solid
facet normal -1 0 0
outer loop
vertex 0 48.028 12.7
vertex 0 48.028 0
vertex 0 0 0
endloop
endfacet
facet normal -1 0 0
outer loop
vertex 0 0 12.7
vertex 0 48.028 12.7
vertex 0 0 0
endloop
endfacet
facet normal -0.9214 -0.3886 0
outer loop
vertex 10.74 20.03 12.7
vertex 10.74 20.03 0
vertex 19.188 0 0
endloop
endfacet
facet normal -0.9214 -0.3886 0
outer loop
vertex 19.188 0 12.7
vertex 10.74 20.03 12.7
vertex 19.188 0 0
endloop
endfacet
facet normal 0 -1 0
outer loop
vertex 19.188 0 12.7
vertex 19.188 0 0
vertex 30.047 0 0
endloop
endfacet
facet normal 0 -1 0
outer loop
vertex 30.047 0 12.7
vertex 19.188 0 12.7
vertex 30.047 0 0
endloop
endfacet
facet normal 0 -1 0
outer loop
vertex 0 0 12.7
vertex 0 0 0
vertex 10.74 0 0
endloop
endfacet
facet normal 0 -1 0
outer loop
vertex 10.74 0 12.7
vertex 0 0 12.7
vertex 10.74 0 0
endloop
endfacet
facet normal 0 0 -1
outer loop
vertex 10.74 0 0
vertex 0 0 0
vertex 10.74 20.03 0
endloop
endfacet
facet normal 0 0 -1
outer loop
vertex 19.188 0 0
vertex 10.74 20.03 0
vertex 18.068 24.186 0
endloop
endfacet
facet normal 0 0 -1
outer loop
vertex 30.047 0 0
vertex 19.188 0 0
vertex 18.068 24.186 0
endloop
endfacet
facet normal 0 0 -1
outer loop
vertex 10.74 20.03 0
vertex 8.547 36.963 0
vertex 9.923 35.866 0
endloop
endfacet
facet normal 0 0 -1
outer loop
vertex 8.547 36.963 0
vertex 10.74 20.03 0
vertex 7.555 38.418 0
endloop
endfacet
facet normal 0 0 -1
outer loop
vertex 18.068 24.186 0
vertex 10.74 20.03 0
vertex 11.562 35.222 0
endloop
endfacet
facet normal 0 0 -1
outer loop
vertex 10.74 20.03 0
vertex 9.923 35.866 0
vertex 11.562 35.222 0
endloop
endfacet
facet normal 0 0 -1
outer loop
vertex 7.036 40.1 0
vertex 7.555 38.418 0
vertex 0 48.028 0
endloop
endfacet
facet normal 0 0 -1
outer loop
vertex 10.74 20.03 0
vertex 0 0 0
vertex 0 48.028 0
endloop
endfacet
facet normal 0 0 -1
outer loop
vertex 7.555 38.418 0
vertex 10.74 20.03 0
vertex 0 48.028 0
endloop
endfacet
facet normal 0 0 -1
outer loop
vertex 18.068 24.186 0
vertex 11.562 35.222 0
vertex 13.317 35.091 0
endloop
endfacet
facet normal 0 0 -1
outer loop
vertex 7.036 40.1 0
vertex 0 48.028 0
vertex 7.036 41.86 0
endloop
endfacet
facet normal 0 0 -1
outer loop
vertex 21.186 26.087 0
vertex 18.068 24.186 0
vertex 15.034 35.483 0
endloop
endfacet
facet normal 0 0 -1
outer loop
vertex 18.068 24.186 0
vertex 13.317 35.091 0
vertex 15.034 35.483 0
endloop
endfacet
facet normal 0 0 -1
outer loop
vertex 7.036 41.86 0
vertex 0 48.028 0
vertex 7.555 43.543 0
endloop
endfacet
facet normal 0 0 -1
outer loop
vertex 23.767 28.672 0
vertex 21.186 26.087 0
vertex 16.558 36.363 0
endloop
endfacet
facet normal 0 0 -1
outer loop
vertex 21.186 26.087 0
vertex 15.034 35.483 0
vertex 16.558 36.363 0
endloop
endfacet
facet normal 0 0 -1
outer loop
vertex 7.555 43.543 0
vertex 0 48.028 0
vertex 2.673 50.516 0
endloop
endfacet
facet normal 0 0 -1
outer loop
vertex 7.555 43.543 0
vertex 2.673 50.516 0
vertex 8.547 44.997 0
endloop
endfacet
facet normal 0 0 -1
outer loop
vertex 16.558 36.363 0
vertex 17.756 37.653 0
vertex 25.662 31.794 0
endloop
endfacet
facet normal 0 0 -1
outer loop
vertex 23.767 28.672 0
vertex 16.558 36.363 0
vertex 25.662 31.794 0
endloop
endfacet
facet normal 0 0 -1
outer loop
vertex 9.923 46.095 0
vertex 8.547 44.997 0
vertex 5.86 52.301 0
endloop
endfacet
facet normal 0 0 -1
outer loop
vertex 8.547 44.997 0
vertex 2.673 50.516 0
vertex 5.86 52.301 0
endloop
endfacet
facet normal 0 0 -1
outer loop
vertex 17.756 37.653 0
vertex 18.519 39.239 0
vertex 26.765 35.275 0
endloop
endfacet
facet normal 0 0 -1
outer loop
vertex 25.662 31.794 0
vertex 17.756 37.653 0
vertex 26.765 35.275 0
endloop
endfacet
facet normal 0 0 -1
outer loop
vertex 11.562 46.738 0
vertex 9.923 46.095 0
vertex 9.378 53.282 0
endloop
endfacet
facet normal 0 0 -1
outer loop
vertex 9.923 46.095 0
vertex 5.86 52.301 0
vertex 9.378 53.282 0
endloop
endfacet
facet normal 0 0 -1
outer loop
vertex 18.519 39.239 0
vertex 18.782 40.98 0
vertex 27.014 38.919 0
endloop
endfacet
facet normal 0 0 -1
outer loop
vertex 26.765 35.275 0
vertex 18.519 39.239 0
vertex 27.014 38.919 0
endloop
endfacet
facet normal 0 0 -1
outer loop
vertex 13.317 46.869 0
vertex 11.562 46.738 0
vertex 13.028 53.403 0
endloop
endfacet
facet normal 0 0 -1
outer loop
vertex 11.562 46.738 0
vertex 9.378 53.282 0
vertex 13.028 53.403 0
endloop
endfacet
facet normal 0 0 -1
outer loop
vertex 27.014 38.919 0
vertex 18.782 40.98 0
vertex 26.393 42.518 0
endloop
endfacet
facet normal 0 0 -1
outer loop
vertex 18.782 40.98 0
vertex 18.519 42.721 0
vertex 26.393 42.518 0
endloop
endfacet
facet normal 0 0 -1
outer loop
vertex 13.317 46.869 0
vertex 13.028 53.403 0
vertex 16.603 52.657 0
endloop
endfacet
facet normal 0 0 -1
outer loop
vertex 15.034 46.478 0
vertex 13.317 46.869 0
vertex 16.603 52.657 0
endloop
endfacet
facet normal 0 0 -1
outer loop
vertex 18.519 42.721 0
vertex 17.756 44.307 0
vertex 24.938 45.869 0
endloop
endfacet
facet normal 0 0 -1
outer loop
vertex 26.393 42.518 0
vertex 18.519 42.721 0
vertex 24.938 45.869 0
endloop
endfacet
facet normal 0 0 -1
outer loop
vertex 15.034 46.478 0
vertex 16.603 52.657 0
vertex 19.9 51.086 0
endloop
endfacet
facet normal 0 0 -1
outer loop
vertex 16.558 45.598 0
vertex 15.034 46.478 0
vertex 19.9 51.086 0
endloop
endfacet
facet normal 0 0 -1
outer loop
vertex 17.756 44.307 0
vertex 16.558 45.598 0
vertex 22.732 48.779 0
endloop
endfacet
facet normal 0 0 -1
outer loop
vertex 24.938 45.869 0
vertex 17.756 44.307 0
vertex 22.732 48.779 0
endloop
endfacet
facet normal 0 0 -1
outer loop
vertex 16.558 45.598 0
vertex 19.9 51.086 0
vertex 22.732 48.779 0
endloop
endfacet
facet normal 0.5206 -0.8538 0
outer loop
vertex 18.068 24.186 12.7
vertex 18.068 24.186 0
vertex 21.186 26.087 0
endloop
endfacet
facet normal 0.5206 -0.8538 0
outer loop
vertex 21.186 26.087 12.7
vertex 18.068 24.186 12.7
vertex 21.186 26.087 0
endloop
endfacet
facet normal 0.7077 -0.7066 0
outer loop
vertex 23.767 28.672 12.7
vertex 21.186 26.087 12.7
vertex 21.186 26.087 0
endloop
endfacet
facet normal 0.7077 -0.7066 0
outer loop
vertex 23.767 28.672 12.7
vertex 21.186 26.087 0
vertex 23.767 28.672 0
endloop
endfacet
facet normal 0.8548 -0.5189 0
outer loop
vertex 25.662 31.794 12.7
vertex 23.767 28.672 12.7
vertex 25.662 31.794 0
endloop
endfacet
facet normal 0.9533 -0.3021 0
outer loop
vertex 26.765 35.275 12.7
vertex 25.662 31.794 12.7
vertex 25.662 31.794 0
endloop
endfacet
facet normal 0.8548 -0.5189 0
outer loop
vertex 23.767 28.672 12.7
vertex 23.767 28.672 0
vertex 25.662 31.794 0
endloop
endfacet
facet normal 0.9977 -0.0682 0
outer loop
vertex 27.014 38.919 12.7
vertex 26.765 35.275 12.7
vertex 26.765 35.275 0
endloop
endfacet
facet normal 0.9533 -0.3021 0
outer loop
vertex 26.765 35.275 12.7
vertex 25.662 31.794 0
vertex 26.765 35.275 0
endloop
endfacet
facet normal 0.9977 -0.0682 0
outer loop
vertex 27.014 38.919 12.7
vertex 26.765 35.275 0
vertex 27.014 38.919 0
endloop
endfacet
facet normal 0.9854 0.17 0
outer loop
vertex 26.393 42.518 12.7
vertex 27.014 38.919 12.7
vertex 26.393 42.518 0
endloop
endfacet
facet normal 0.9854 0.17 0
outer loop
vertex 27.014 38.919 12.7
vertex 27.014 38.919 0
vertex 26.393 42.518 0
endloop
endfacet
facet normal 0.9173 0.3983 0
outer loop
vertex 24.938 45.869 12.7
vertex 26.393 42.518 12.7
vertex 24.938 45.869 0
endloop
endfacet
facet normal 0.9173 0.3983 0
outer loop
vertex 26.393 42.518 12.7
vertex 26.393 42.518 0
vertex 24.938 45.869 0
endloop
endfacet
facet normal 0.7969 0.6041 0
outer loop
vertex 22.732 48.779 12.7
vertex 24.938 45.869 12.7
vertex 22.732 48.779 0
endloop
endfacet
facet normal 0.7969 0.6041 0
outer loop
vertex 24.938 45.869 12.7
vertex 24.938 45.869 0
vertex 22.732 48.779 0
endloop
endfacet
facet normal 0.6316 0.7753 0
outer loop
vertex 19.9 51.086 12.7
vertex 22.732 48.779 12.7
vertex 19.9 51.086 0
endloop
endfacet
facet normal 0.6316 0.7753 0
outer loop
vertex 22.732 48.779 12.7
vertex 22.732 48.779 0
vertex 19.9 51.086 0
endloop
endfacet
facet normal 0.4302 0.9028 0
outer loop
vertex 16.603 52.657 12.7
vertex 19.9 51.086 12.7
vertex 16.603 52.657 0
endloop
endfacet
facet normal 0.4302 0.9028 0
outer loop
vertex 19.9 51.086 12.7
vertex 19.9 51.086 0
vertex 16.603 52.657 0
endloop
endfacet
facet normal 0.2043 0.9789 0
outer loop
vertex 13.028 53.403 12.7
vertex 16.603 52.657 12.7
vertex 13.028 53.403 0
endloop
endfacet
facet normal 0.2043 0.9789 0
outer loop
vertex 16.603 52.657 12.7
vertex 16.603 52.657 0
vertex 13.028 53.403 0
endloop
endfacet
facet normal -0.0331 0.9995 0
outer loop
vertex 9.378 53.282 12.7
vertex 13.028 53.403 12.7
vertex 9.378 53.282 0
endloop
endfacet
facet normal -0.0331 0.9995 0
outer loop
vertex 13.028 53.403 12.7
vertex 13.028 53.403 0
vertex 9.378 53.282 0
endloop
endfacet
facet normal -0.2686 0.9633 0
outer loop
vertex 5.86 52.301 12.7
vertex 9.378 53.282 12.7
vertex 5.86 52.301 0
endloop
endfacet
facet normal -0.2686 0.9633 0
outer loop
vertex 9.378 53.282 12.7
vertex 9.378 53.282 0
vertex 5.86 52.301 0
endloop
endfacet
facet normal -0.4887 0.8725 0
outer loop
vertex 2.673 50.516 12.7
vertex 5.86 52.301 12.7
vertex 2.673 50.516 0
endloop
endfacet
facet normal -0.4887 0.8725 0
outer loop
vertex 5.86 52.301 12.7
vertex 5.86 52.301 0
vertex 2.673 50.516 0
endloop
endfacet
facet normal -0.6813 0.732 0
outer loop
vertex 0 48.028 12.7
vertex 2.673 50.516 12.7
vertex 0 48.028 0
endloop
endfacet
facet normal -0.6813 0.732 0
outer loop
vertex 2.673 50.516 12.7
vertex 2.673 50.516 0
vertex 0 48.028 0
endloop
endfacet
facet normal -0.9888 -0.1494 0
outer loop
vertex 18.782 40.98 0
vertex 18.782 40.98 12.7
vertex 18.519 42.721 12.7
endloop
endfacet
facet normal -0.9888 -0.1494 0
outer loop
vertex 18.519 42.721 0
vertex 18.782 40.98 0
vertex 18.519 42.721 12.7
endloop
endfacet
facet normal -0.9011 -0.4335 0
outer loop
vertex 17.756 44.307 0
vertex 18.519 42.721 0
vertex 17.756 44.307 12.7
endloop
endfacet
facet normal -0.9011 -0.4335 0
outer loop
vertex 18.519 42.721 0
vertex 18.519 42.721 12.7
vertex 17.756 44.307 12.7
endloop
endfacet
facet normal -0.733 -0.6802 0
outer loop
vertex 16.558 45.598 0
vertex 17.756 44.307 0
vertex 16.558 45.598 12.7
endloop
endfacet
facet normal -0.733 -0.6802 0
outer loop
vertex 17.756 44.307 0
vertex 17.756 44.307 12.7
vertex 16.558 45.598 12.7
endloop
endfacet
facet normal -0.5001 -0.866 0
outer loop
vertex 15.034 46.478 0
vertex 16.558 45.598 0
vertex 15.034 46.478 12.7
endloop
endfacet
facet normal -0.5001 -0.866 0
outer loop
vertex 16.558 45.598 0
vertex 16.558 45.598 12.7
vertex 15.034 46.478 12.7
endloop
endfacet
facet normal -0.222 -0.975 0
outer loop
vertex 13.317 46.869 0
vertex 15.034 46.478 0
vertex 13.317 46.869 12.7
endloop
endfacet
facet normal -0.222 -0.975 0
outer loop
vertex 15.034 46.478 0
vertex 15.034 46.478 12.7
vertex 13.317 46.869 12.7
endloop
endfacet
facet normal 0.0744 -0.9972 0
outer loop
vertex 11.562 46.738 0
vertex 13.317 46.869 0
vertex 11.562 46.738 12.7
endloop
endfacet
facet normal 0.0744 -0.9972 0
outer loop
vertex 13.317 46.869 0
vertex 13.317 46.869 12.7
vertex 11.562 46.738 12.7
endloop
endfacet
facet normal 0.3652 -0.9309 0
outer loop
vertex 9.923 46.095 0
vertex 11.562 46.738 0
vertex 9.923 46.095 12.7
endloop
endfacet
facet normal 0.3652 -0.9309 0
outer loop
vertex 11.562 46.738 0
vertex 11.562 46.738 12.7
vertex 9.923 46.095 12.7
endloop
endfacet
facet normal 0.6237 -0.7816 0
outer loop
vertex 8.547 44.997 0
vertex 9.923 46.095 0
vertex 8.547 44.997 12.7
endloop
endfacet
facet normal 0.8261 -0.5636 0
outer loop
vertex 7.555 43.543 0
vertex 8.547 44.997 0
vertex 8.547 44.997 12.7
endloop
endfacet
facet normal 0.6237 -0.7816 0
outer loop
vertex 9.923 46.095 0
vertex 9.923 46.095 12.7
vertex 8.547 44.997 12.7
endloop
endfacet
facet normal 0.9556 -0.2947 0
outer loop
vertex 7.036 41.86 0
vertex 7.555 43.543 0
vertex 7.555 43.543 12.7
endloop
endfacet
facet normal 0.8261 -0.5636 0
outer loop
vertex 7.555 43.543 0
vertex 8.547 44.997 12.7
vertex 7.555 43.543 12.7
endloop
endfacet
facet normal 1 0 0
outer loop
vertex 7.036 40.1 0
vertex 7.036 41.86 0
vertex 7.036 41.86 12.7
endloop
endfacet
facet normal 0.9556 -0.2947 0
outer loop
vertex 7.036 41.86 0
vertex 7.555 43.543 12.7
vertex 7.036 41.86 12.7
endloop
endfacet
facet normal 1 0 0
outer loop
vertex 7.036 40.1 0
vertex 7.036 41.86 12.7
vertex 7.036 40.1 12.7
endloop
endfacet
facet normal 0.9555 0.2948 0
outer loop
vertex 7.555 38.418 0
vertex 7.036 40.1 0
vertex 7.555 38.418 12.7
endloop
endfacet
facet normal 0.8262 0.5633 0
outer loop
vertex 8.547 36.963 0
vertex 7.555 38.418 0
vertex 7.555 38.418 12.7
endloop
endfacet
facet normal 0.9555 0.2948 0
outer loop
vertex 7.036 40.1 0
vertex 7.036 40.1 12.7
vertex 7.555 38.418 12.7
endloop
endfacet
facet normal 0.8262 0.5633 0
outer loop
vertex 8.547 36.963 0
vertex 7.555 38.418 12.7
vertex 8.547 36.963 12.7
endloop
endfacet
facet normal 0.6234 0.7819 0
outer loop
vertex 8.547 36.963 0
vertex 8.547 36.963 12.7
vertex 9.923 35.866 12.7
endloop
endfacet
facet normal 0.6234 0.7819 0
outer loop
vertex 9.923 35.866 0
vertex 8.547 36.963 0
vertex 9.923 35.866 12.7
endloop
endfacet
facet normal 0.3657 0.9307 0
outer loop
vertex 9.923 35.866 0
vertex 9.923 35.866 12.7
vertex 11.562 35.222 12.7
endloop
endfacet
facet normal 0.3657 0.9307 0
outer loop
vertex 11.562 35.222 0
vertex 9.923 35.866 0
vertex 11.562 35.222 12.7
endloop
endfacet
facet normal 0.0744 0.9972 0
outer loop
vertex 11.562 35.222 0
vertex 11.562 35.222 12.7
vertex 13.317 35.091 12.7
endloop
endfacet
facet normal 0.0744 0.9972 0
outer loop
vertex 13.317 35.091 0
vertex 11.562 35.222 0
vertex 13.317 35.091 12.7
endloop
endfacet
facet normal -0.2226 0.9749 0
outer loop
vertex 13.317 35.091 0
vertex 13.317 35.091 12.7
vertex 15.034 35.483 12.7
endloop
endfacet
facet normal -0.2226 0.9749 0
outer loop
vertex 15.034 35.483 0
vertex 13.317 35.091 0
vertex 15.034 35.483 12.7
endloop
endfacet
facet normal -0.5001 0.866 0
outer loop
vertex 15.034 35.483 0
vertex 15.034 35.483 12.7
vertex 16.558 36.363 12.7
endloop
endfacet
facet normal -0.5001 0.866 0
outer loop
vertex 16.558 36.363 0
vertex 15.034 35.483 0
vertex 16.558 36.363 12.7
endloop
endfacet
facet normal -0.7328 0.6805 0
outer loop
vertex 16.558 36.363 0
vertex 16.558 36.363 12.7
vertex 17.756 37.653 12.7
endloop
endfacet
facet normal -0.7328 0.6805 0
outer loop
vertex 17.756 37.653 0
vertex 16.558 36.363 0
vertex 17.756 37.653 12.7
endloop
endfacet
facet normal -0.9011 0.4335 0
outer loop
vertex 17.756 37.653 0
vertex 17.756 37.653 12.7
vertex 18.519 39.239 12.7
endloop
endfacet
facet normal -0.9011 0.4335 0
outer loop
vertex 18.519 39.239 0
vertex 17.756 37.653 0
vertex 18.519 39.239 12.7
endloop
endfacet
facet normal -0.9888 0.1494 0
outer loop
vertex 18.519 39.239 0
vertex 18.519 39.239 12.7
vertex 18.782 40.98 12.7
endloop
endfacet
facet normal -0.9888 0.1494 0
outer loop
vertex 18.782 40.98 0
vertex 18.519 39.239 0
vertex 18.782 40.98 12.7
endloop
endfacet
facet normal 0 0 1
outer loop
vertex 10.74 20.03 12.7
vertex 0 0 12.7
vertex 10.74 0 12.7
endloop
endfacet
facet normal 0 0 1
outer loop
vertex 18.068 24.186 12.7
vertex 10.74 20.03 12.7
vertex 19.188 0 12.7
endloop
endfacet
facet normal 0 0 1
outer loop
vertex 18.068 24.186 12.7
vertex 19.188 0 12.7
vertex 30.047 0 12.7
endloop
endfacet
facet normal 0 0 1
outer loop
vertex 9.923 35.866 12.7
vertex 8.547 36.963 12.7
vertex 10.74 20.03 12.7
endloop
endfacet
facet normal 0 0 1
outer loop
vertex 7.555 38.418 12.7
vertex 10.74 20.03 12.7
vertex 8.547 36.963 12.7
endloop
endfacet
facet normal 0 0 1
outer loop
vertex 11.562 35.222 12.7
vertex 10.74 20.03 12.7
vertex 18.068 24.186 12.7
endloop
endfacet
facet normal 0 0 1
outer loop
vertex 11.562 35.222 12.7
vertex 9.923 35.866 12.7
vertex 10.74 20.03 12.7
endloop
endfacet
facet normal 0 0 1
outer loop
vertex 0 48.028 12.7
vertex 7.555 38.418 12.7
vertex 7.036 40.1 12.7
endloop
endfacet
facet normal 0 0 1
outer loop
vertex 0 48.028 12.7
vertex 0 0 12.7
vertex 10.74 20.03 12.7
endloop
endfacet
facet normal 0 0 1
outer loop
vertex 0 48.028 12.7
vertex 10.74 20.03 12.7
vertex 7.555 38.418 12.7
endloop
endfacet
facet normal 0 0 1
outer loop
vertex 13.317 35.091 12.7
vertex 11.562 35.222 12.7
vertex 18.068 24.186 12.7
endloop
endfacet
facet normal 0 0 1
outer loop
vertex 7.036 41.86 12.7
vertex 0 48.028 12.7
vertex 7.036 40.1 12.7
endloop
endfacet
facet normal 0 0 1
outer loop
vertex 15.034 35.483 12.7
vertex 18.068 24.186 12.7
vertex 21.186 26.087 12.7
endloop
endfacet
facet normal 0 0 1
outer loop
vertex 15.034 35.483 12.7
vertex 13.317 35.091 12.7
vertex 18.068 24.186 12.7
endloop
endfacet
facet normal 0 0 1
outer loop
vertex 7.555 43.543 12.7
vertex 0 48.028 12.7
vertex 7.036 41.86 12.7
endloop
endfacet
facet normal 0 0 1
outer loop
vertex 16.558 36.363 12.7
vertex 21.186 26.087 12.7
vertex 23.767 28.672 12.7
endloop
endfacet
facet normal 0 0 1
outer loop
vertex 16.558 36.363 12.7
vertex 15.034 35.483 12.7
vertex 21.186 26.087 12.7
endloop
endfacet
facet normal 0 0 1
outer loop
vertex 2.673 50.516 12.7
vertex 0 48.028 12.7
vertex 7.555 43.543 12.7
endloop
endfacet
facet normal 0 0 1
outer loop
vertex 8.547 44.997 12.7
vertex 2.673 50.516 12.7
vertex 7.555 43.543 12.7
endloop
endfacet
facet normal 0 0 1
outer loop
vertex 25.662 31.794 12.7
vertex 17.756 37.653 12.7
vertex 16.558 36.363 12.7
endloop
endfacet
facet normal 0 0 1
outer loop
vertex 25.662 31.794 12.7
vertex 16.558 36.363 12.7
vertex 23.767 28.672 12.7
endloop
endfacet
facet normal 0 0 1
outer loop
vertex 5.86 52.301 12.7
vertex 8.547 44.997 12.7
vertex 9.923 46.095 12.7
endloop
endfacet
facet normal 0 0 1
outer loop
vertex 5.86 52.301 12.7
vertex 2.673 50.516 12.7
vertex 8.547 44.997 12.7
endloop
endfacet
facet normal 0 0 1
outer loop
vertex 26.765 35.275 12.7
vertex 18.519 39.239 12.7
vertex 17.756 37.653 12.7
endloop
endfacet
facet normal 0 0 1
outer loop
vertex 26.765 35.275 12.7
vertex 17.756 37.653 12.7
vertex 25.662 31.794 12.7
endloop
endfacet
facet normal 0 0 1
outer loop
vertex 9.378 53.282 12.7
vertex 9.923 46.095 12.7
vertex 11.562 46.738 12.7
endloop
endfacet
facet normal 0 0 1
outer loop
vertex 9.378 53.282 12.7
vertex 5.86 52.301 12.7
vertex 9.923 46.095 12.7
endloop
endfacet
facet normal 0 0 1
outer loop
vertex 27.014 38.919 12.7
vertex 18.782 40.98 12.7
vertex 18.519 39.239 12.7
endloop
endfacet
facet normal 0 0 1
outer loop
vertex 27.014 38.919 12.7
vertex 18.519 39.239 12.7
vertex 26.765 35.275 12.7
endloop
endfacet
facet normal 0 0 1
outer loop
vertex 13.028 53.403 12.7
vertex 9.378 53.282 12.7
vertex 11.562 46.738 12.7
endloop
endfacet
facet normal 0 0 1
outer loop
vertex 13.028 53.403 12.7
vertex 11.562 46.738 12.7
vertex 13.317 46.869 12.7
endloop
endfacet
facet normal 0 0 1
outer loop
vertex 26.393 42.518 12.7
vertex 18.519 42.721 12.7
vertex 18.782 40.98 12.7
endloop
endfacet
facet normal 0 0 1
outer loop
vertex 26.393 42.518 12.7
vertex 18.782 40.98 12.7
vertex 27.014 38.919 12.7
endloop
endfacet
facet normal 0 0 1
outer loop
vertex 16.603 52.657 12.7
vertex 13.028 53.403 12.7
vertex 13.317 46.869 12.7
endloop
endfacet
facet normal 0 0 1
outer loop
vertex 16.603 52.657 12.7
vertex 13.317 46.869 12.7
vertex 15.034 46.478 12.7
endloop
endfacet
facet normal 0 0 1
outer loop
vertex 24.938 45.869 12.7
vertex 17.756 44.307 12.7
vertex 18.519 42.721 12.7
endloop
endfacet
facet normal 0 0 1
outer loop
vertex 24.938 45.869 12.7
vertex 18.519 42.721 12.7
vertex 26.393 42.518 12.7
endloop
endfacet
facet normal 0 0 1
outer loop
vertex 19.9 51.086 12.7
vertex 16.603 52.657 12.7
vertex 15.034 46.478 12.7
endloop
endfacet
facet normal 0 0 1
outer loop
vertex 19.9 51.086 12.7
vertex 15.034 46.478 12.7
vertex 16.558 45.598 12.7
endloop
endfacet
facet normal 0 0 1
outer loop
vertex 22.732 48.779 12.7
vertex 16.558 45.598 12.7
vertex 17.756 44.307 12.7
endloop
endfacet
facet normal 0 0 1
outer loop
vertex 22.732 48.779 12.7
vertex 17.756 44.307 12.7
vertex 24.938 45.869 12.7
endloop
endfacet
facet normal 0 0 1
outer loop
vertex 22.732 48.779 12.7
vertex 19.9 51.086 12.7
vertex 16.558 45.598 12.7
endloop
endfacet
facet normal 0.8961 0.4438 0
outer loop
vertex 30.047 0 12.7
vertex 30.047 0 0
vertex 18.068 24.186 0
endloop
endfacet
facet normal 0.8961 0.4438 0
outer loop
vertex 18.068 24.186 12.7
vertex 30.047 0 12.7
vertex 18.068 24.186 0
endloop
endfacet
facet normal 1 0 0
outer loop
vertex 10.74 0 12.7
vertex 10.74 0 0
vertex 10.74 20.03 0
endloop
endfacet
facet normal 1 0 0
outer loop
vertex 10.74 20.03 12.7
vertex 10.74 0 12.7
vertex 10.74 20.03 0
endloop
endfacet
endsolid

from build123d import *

# Parameters (mm, degrees)
F1_DEPTH = 12.7
F2_R     = 5.905857
F3_DEPTH = 25.4


with BuildPart() as f1:
    # F0 (on Top) → F1 (new body)
    with BuildSketch(Plane.XY):
        with BuildLine():
            Line((0, 48.02762), (0, 0))
            Line((0, 0), (10.74041, 0))
            Line((10.74041, 0), (10.74041, 20.030156))
            Line((10.74041, 20.030156), (19.187918, 0))
            Line((19.187918, 0), (30.046732, 0))
            Line((30.046732, 0), (18.06753, 24.186372))
            ThreePointArc((18.06753, 24.186372), (23.922272, 47.389901), (0, 48.02762))
        make_face()
    extrude(amount=F1_DEPTH)

    # F2 (on face) → F3 (cut)
    with BuildSketch(Plane.XY.offset(12.7)):
        with Locations((12.875857, 40.980149)):
            Circle(F2_R)
    extrude(amount=-F3_DEPTH, mode=Mode.SUBTRACT)


solid = f1.part
